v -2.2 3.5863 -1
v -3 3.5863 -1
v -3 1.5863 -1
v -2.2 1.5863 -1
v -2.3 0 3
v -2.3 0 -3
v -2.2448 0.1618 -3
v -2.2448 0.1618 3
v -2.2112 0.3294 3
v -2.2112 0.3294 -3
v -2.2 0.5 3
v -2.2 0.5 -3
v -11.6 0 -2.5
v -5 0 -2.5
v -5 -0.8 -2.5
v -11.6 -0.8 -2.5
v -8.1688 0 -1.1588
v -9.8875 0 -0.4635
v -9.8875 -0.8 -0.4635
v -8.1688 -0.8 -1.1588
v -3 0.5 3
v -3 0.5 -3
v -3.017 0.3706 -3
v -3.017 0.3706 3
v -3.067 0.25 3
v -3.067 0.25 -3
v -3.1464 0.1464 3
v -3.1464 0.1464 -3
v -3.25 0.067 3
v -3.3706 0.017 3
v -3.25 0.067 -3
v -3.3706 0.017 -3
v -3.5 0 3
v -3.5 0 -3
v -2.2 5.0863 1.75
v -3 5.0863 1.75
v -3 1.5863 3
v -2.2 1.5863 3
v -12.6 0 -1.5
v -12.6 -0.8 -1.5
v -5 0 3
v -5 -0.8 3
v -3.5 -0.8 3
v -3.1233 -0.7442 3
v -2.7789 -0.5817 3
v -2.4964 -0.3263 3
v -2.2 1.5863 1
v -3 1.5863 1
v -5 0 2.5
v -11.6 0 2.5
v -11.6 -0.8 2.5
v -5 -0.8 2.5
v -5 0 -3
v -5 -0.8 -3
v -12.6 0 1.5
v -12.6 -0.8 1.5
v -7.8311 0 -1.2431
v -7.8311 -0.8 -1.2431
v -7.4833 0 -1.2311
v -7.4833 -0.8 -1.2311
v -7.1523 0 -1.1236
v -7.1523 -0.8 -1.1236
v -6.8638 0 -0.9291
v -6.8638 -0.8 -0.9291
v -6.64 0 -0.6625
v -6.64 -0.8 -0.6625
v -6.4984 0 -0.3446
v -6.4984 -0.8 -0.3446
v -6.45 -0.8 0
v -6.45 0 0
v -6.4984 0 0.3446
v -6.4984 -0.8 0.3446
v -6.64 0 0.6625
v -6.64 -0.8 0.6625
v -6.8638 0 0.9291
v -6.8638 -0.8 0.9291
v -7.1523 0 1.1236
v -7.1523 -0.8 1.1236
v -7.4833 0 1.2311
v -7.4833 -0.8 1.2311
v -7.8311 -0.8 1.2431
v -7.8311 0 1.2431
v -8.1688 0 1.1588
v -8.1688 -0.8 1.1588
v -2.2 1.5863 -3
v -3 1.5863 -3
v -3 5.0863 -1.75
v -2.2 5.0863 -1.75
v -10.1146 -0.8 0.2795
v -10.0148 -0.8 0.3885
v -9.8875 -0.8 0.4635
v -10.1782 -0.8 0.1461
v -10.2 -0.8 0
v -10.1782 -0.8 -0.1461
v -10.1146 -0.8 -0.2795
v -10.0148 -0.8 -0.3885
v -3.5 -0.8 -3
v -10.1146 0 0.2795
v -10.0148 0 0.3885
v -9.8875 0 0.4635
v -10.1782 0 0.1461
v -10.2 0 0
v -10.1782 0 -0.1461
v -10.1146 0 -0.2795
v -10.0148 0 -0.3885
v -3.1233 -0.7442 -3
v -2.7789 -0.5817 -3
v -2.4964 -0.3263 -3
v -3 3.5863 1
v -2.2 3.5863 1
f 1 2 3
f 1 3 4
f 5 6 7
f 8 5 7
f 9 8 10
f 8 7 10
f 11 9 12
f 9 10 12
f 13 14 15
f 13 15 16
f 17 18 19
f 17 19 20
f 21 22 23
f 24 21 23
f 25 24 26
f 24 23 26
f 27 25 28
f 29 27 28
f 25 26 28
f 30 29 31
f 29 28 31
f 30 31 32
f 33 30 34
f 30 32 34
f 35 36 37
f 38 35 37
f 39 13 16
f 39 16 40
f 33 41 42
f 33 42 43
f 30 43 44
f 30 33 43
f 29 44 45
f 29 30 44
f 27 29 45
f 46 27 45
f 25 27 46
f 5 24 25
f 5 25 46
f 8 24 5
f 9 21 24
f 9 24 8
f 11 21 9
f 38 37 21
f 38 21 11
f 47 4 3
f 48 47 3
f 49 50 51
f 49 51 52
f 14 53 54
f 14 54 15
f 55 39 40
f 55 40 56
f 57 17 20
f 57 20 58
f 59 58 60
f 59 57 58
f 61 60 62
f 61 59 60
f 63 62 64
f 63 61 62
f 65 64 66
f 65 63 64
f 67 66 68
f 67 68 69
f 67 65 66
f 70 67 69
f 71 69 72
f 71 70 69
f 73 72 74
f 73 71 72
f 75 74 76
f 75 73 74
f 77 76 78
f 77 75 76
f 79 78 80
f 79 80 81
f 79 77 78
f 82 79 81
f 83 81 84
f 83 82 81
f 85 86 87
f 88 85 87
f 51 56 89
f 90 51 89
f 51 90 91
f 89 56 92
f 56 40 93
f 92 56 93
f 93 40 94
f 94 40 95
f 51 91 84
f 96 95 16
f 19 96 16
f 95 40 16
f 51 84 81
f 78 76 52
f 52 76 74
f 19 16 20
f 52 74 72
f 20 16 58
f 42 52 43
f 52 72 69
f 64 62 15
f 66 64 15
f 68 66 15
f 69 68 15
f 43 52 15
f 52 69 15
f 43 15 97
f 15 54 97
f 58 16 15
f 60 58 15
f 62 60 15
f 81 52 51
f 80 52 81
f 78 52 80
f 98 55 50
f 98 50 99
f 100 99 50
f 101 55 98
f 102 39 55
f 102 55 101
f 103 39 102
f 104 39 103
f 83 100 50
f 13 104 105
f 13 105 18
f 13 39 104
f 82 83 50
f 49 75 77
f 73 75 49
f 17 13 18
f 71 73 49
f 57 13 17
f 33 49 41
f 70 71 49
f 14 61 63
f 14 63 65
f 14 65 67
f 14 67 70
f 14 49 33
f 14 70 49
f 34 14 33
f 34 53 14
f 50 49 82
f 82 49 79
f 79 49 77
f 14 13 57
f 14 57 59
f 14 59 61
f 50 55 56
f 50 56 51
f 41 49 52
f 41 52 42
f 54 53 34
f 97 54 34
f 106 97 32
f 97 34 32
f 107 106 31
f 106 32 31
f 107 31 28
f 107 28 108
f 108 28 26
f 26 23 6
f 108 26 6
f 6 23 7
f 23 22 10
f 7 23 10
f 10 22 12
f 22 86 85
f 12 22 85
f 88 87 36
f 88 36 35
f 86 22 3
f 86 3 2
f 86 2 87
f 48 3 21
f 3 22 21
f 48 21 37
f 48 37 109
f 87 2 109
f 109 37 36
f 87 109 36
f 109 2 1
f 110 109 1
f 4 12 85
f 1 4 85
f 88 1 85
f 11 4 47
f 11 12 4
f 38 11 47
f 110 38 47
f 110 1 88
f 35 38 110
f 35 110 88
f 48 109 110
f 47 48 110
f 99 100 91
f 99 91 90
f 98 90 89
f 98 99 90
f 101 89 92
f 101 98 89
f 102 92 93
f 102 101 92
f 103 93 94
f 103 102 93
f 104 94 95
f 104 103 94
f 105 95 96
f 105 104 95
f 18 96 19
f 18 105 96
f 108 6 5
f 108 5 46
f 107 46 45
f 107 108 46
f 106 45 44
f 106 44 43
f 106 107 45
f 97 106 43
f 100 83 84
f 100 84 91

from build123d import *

# Parameters (mm, degrees)
SKETCH_1_W             = 2
SKETCH_1_H             = 2
SM_BASE_FLANGE_1_DEPTH = 0.8
OTHER_START            = -3
OTHER_2_DEPTH          = 6
OTHER_START_2          = -1.75
OTHER_2_2_OUTLINE_W    = 0.8
OTHER_2_2_OUTLINE_H    = 1.5
OTHER_2_2_DEPTH        = 3.5
OTHER_2_3_DEPTH        = 6
OTHER_2_4_OUTLINE_W    = 0.8
OTHER_2_4_OUTLINE_H    = 2
OTHER_2_4_DEPTH        = 0.75
OTHER_START_3          = 1
OTHER_2_5_OUTLINE_W    = 0.8
OTHER_2_5_OUTLINE_H    = 2
OTHER_2_5_DEPTH        = 0.75
OTHER_2_6_DEPTH        = 0.8


with BuildPart() as part:
    # Базовая кромка1: sheet metal written as solids
    # Sketch 1 → Базовая кромка1 (new body)
    with BuildSketch(Plane(origin=(0, 0, 0), x_dir=(1, 0, 0), z_dir=(0, 1, 0))):
        Polygon((2.5, -1.75), (2.5, 1.75), (-1, 3), (-5, 3), (-5, 2.5), (-11.6, 2.5), (-12.6, 1.5), (-12.6, -1.5), (-11.6, -2.5), (-5, -2.5), (-5, -3), (-1, -3), align=None)
        with BuildLine():
            Line((-9.8875, 0.463512405), (-8.16875, 1.158781014))
            ThreePointArc((-8.16875, 1.158781014), (-6.45, 0), (-8.16875, -1.158781014))
            Line((-8.16875, -1.158781014), (-9.8875, -0.463512405))
            ThreePointArc((-9.8875, -0.463512405), (-10.2, 0), (-9.8875, 0.463512405))
        make_face(mode=Mode.SUBTRACT)
        Rectangle(SKETCH_1_W, SKETCH_1_H, mode=Mode.SUBTRACT)
    extrude(amount=-SM_BASE_FLANGE_1_DEPTH)

    # Other 2: read off the stored shape, not the designer's step
    # Other 2 outline → Other 2 (cut)
    with BuildSketch(Plane.XY.offset(OTHER_START)):
        with BuildLine():
            ThreePointArc((-2.299999999, 0), (-2.778889744, -0.581665383), (-3.5, -0.8))
            Line((-3.5, -0.8), (2.5, -0.8))
            Line((2.5, -0.8), (2.5, 0))
            Line((2.5, 0), (-2.299999999, 0))
        make_face()
    extrude(amount=OTHER_2_DEPTH, mode=Mode.SUBTRACT)

    # Other 2 2 outline → Other 2 2 (add)
    with BuildSketch(Plane.XY.offset(OTHER_START_2)):
        with Locations((-2.6, 4.336283306)):
            Rectangle(OTHER_2_2_OUTLINE_W, OTHER_2_2_OUTLINE_H)
        with BuildLine():
            Line((-2.2, 0.5), (-2.2, 1.586283306))
            Line((-2.2, 1.586283306), (-3, 1.586283306))
            Line((-3, 1.586283306), (-3, 0.5))
            ThreePointArc((-3, 0.5), (-3.146446609, 0.146446609), (-3.5, 0))
            Line((-3.5, 0), (-2.299999999, 0))
            ThreePointArc((-2.299999999, 0), (-2.225245121, 0.245049024), (-2.2, 0.5))
        make_face()
    extrude(amount=OTHER_2_2_DEPTH)

    # Other 2 3 outline → Other 2 3 (add)
    with BuildSketch(Plane.XY.offset(OTHER_START)):
        with BuildLine():
            Line((-2.2, 0.5), (-2.2, 1.586283306))
            Line((-2.2, 1.586283306), (-3, 1.586283306))
            Line((-3, 1.586283306), (-3, 0.5))
            ThreePointArc((-3, 0.5), (-3.146446609, 0.146446609), (-3.5, 0))
            Line((-3.5, 0), (-2.299999999, 0))
            ThreePointArc((-2.299999999, 0), (-2.225245121, 0.245049024), (-2.2, 0.5))
        make_face()
    extrude(amount=OTHER_2_3_DEPTH)

    # Other 2 4 outline → Other 2 4 (add)
    with BuildSketch(Plane.XY.offset(OTHER_START_2)):
        with Locations((-2.6, 2.586283306)):
            Rectangle(OTHER_2_4_OUTLINE_W, OTHER_2_4_OUTLINE_H)
    extrude(amount=OTHER_2_4_DEPTH)

    # Other 2 5 outline → Other 2 5 (add)
    with BuildSketch(Plane.XY.offset(OTHER_START_3)):
        with Locations((-2.6, 2.586283306)):
            Rectangle(OTHER_2_5_OUTLINE_W, OTHER_2_5_OUTLINE_H)
    extrude(amount=OTHER_2_5_DEPTH)

    # Other 2 6 outline → Other 2 6 (add)
    with BuildSketch(Plane.YZ.offset(OTHER_START)):
        Polygon((1.586283306, -1.75), (1.586283306, -3), (5.086283306, -1.75), align=None)
        Polygon((1.586283306, 1.75), (5.086283306, 1.75), (1.586283306, 3), align=None)
    extrude(amount=OTHER_2_6_DEPTH)


solid = part.part
